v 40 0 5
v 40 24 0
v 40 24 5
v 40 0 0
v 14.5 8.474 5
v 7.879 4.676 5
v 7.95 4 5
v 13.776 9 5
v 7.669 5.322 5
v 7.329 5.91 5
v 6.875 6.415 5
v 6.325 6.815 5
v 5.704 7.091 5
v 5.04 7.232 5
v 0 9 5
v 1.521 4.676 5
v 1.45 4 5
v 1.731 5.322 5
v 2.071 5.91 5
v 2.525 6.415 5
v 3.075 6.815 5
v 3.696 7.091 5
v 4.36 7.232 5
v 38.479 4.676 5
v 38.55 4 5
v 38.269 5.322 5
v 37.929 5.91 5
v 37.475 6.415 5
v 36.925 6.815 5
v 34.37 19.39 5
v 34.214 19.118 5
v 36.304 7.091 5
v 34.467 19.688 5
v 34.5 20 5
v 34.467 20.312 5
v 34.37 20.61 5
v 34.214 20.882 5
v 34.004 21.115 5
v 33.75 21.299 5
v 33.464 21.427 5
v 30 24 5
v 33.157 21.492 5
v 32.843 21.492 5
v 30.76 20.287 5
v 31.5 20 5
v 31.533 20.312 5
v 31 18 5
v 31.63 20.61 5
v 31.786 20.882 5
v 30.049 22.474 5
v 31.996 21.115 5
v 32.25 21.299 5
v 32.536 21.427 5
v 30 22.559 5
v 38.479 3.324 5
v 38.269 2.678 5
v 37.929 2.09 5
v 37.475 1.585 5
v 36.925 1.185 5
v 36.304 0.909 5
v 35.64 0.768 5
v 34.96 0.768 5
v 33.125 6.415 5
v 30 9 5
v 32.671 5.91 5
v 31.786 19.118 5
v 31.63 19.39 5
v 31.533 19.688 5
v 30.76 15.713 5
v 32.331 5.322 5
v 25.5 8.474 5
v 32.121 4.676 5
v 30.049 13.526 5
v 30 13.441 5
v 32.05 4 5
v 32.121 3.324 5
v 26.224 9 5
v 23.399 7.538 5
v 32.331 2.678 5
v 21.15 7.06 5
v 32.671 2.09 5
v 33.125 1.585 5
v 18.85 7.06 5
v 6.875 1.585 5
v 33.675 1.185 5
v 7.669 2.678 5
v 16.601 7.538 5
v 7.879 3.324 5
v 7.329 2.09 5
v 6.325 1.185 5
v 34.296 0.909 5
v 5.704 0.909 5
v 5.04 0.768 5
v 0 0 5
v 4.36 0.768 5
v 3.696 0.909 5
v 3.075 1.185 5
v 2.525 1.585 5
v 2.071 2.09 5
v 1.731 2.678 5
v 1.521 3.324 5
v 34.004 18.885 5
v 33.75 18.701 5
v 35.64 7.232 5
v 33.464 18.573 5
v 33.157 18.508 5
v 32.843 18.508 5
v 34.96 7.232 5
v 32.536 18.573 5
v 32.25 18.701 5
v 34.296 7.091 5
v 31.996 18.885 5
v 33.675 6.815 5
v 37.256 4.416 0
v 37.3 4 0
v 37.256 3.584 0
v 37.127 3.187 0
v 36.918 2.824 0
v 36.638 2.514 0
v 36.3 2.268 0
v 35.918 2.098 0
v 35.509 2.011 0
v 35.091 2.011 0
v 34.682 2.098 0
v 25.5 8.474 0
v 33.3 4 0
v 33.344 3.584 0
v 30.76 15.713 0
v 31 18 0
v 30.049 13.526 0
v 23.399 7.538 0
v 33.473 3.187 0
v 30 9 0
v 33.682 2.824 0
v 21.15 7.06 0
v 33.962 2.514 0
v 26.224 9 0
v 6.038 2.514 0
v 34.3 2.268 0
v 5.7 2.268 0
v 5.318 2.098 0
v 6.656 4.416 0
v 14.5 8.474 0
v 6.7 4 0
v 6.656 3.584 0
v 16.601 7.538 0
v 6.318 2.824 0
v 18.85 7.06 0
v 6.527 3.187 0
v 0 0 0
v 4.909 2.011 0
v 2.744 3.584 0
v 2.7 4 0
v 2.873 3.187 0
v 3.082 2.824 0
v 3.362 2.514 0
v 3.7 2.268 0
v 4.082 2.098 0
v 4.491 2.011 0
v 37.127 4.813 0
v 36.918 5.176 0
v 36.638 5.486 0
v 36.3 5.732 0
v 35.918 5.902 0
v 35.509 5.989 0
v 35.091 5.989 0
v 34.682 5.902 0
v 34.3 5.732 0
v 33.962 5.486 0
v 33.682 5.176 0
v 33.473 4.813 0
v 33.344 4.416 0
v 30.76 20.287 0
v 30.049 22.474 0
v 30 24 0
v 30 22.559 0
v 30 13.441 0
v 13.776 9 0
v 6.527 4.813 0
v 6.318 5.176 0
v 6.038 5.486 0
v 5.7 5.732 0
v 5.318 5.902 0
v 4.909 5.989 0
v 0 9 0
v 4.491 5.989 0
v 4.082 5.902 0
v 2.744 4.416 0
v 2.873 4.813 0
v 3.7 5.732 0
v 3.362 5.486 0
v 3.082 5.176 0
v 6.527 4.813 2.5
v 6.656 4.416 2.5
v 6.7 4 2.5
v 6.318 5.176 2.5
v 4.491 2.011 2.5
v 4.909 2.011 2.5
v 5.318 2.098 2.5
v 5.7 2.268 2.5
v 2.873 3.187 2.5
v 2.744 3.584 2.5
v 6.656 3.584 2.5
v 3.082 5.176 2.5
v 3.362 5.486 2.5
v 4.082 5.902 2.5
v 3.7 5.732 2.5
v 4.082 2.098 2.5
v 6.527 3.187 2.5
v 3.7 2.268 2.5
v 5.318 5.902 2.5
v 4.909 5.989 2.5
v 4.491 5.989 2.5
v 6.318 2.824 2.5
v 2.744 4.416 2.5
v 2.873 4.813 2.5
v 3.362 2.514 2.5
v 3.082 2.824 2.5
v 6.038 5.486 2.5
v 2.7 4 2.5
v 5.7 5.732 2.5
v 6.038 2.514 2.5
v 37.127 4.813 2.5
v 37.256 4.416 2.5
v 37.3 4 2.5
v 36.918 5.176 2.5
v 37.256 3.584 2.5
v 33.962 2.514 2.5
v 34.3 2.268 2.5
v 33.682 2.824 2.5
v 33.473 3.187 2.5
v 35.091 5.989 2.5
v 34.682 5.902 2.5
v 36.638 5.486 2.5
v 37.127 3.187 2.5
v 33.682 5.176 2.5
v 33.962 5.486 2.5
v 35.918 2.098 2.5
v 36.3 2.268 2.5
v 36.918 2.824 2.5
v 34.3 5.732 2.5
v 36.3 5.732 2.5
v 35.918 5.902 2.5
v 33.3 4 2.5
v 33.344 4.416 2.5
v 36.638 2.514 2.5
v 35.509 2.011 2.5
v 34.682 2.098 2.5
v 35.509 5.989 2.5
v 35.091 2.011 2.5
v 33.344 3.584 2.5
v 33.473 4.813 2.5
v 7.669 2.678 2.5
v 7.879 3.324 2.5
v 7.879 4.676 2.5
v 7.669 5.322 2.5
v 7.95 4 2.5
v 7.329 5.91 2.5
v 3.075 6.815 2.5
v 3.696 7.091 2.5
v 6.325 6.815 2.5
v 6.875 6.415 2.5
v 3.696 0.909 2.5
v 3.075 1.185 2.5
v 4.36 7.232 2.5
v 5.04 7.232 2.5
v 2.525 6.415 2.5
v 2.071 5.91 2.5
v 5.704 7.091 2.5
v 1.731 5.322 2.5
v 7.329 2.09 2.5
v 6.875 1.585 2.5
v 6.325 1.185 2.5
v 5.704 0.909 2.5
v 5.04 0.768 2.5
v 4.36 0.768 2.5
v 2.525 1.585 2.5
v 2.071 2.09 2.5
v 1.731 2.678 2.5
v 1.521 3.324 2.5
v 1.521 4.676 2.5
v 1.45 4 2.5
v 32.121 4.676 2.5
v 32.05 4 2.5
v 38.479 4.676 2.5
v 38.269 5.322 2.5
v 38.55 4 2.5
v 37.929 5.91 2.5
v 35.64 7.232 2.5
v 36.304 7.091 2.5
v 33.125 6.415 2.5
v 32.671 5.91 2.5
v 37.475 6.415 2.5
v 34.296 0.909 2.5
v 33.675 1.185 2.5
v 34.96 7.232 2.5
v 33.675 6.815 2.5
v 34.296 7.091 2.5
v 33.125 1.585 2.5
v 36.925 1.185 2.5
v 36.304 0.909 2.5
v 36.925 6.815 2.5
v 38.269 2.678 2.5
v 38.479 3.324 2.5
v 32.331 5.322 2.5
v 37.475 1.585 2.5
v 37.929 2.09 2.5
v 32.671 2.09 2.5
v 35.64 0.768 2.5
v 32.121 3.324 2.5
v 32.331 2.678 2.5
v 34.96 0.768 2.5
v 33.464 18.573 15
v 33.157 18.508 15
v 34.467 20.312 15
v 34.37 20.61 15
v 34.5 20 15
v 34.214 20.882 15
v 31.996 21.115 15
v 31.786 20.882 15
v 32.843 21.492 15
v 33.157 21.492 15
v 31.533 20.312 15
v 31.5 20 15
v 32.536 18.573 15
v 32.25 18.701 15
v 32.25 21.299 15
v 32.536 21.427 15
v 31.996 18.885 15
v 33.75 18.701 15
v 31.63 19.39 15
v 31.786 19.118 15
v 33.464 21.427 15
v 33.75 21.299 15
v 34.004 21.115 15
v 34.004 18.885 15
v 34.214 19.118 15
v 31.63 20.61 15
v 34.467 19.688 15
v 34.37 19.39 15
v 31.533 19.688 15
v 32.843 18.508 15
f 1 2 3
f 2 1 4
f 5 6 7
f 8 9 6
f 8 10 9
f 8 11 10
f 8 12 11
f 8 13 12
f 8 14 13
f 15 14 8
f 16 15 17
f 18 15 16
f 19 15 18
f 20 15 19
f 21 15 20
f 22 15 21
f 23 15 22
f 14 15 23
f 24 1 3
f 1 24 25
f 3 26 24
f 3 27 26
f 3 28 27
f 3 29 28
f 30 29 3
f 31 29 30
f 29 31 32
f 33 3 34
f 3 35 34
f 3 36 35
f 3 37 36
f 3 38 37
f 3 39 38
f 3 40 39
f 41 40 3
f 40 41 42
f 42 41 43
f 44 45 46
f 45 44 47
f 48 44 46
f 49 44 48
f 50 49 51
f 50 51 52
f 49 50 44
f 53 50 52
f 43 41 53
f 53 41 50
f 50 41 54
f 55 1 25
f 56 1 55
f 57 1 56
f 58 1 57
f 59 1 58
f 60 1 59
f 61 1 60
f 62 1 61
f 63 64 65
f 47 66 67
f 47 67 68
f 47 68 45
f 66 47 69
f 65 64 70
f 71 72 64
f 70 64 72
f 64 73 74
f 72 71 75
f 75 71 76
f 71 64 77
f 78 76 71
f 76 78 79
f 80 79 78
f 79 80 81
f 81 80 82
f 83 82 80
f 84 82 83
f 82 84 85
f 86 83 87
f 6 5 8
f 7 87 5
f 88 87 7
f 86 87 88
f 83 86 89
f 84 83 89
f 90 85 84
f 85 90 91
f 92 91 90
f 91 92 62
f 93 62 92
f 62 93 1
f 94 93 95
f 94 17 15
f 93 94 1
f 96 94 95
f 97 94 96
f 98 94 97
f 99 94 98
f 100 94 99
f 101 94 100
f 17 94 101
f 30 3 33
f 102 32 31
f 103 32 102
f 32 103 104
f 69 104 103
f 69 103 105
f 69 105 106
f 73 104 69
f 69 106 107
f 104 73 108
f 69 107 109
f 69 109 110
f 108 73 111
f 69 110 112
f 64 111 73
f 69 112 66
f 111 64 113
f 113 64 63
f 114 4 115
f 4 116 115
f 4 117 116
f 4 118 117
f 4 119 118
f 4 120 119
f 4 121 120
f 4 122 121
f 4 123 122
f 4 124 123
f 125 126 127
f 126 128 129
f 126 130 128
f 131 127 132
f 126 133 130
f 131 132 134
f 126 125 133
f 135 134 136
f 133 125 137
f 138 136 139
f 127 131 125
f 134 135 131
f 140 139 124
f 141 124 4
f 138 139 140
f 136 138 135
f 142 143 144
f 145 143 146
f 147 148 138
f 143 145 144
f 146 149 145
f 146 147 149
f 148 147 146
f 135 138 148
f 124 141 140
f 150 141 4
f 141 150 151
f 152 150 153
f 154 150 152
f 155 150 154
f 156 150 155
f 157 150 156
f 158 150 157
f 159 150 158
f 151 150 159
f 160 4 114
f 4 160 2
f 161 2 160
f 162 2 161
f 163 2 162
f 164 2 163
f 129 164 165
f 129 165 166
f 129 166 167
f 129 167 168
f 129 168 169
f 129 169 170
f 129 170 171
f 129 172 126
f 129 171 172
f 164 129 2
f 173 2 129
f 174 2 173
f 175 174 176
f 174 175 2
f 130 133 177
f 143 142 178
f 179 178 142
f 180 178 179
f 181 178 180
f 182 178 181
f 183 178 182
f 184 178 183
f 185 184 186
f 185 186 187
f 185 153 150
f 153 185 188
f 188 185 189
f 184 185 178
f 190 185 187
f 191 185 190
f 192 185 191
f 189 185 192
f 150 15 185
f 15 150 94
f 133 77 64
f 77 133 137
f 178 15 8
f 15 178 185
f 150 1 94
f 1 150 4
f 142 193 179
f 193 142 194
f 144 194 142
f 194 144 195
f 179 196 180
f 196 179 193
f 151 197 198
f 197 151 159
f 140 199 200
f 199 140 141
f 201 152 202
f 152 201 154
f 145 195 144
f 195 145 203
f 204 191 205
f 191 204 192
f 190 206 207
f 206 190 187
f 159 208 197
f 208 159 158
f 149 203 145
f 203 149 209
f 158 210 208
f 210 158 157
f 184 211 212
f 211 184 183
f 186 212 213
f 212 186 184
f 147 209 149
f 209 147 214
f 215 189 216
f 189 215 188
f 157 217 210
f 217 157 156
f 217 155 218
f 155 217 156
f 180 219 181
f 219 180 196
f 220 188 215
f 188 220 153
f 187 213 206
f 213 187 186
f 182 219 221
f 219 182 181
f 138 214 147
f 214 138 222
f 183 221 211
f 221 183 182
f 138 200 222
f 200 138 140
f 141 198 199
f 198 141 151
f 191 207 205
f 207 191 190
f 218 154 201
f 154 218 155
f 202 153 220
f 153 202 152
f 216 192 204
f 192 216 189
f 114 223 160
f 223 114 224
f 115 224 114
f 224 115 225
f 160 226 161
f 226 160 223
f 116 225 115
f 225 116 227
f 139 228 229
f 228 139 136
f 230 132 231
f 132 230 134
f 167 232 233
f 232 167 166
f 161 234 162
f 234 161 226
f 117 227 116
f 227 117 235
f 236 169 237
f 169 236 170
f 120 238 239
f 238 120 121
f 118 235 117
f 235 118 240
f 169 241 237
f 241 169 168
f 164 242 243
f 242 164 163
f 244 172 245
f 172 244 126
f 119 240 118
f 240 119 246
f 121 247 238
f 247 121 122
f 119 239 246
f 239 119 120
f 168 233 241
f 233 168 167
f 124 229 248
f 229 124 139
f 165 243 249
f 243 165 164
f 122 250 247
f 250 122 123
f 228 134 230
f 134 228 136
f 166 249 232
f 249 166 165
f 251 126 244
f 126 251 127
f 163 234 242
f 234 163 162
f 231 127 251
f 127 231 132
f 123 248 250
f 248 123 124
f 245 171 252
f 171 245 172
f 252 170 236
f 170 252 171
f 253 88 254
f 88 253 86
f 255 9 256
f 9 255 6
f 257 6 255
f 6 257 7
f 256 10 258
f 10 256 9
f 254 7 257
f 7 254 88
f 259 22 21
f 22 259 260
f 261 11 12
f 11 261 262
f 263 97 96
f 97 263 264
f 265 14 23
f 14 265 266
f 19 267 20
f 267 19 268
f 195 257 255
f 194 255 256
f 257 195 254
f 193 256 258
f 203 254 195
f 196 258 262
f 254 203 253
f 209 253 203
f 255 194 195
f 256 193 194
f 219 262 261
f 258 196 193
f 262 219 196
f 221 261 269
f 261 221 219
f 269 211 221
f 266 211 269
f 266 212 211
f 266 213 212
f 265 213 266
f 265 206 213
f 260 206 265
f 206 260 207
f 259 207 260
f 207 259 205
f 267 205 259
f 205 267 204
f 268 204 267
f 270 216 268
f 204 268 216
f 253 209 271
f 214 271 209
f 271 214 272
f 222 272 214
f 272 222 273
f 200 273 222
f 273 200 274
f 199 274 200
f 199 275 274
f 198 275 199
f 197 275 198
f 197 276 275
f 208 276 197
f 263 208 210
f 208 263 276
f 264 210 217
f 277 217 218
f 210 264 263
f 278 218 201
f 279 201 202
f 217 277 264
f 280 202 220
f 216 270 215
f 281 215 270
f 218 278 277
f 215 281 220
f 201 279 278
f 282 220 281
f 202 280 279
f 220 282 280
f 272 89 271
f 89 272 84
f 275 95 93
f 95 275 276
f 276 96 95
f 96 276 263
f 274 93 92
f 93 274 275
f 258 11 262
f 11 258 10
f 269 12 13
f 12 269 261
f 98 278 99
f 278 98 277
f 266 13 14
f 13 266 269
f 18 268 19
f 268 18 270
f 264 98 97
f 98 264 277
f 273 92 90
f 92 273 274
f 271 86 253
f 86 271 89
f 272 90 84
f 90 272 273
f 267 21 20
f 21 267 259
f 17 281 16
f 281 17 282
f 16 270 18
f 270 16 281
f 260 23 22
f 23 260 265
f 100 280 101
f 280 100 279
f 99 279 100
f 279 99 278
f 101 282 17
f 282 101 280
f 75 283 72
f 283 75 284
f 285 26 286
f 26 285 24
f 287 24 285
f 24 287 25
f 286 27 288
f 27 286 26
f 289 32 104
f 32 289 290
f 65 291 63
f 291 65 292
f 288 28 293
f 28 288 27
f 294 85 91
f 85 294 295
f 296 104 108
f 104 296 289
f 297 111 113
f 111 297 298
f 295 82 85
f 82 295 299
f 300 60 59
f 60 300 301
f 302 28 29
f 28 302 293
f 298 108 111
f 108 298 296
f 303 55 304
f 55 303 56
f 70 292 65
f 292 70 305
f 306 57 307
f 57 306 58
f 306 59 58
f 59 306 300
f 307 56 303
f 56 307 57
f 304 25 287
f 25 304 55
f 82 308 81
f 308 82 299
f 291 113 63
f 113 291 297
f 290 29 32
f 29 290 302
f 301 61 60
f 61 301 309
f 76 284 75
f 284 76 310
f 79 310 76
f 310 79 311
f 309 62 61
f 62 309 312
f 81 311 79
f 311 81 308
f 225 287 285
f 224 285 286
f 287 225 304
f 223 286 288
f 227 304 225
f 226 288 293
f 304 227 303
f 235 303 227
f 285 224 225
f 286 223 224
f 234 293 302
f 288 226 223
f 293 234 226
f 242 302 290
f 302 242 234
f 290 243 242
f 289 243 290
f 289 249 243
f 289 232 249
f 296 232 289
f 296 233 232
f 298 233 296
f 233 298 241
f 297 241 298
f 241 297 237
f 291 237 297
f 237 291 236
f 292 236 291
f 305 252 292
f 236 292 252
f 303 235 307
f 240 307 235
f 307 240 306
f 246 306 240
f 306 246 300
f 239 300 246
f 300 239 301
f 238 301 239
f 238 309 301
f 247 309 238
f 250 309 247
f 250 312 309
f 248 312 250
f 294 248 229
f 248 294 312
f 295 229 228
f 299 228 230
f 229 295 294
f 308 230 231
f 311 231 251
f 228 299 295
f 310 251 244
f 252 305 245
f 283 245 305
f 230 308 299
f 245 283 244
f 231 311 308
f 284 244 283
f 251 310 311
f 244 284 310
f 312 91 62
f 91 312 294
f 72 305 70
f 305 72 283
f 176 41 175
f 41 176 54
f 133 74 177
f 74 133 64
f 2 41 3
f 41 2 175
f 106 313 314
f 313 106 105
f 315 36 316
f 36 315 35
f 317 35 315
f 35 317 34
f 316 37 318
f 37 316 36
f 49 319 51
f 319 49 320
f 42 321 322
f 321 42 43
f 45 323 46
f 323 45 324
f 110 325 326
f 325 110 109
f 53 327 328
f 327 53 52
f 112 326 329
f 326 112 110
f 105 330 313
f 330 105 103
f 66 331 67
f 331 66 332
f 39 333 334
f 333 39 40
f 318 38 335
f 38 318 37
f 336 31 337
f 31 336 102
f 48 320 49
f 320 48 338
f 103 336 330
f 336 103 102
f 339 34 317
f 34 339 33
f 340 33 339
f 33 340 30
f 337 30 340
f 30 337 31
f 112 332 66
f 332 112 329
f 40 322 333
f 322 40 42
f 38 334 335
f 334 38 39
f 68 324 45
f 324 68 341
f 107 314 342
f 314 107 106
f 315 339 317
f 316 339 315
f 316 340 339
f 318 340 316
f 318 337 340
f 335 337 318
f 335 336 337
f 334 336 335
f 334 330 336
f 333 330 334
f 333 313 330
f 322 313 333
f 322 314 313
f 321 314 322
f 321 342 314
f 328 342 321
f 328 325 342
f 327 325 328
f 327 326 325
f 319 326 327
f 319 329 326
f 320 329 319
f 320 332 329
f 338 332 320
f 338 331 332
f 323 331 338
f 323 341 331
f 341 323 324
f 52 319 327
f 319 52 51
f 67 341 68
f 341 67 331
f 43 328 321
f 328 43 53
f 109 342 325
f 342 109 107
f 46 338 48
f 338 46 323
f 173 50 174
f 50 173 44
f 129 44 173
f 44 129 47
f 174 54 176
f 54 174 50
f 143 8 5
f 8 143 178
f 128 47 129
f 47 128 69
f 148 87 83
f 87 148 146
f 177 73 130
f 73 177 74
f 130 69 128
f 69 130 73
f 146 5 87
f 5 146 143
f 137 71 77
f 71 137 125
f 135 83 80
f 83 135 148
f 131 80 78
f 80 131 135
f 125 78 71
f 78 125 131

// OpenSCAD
//kossel 2020 replacement extruder

$fn=30;

ID=3;
screw_diameter = 4;
screw_head_diameter = 6.5;
screw_head_height = 2.5;
thickness = 5;
ID = 3;

difference(){
union(){
    difference(){
           cube([40,9,thickness]);
        
          //screw holes
          offset = 4.7;
          translate([offset,4,-1]) cylinder(h=10,d=screw_diameter);
          translate([40-offset,4,-1]) cylinder(h=10,d=screw_diameter);
        
          //screw head indent
          translate([offset,4,thickness-screw_head_height]) cylinder(h=10,d=screw_head_diameter);
          translate([40-offset,4,thickness-screw_head_height]) cylinder(h=10,d=screw_head_diameter);
        }
    
    translate([40-10,0,0])  union(){
        translate([0,9,0]) cube([10,24-9,thickness]);
        translate([3,20,thickness]) cylinder(h=10,d=ID);
        }
    }
translate([20,18,-1]) cylinder(h=200,d=22);
}
